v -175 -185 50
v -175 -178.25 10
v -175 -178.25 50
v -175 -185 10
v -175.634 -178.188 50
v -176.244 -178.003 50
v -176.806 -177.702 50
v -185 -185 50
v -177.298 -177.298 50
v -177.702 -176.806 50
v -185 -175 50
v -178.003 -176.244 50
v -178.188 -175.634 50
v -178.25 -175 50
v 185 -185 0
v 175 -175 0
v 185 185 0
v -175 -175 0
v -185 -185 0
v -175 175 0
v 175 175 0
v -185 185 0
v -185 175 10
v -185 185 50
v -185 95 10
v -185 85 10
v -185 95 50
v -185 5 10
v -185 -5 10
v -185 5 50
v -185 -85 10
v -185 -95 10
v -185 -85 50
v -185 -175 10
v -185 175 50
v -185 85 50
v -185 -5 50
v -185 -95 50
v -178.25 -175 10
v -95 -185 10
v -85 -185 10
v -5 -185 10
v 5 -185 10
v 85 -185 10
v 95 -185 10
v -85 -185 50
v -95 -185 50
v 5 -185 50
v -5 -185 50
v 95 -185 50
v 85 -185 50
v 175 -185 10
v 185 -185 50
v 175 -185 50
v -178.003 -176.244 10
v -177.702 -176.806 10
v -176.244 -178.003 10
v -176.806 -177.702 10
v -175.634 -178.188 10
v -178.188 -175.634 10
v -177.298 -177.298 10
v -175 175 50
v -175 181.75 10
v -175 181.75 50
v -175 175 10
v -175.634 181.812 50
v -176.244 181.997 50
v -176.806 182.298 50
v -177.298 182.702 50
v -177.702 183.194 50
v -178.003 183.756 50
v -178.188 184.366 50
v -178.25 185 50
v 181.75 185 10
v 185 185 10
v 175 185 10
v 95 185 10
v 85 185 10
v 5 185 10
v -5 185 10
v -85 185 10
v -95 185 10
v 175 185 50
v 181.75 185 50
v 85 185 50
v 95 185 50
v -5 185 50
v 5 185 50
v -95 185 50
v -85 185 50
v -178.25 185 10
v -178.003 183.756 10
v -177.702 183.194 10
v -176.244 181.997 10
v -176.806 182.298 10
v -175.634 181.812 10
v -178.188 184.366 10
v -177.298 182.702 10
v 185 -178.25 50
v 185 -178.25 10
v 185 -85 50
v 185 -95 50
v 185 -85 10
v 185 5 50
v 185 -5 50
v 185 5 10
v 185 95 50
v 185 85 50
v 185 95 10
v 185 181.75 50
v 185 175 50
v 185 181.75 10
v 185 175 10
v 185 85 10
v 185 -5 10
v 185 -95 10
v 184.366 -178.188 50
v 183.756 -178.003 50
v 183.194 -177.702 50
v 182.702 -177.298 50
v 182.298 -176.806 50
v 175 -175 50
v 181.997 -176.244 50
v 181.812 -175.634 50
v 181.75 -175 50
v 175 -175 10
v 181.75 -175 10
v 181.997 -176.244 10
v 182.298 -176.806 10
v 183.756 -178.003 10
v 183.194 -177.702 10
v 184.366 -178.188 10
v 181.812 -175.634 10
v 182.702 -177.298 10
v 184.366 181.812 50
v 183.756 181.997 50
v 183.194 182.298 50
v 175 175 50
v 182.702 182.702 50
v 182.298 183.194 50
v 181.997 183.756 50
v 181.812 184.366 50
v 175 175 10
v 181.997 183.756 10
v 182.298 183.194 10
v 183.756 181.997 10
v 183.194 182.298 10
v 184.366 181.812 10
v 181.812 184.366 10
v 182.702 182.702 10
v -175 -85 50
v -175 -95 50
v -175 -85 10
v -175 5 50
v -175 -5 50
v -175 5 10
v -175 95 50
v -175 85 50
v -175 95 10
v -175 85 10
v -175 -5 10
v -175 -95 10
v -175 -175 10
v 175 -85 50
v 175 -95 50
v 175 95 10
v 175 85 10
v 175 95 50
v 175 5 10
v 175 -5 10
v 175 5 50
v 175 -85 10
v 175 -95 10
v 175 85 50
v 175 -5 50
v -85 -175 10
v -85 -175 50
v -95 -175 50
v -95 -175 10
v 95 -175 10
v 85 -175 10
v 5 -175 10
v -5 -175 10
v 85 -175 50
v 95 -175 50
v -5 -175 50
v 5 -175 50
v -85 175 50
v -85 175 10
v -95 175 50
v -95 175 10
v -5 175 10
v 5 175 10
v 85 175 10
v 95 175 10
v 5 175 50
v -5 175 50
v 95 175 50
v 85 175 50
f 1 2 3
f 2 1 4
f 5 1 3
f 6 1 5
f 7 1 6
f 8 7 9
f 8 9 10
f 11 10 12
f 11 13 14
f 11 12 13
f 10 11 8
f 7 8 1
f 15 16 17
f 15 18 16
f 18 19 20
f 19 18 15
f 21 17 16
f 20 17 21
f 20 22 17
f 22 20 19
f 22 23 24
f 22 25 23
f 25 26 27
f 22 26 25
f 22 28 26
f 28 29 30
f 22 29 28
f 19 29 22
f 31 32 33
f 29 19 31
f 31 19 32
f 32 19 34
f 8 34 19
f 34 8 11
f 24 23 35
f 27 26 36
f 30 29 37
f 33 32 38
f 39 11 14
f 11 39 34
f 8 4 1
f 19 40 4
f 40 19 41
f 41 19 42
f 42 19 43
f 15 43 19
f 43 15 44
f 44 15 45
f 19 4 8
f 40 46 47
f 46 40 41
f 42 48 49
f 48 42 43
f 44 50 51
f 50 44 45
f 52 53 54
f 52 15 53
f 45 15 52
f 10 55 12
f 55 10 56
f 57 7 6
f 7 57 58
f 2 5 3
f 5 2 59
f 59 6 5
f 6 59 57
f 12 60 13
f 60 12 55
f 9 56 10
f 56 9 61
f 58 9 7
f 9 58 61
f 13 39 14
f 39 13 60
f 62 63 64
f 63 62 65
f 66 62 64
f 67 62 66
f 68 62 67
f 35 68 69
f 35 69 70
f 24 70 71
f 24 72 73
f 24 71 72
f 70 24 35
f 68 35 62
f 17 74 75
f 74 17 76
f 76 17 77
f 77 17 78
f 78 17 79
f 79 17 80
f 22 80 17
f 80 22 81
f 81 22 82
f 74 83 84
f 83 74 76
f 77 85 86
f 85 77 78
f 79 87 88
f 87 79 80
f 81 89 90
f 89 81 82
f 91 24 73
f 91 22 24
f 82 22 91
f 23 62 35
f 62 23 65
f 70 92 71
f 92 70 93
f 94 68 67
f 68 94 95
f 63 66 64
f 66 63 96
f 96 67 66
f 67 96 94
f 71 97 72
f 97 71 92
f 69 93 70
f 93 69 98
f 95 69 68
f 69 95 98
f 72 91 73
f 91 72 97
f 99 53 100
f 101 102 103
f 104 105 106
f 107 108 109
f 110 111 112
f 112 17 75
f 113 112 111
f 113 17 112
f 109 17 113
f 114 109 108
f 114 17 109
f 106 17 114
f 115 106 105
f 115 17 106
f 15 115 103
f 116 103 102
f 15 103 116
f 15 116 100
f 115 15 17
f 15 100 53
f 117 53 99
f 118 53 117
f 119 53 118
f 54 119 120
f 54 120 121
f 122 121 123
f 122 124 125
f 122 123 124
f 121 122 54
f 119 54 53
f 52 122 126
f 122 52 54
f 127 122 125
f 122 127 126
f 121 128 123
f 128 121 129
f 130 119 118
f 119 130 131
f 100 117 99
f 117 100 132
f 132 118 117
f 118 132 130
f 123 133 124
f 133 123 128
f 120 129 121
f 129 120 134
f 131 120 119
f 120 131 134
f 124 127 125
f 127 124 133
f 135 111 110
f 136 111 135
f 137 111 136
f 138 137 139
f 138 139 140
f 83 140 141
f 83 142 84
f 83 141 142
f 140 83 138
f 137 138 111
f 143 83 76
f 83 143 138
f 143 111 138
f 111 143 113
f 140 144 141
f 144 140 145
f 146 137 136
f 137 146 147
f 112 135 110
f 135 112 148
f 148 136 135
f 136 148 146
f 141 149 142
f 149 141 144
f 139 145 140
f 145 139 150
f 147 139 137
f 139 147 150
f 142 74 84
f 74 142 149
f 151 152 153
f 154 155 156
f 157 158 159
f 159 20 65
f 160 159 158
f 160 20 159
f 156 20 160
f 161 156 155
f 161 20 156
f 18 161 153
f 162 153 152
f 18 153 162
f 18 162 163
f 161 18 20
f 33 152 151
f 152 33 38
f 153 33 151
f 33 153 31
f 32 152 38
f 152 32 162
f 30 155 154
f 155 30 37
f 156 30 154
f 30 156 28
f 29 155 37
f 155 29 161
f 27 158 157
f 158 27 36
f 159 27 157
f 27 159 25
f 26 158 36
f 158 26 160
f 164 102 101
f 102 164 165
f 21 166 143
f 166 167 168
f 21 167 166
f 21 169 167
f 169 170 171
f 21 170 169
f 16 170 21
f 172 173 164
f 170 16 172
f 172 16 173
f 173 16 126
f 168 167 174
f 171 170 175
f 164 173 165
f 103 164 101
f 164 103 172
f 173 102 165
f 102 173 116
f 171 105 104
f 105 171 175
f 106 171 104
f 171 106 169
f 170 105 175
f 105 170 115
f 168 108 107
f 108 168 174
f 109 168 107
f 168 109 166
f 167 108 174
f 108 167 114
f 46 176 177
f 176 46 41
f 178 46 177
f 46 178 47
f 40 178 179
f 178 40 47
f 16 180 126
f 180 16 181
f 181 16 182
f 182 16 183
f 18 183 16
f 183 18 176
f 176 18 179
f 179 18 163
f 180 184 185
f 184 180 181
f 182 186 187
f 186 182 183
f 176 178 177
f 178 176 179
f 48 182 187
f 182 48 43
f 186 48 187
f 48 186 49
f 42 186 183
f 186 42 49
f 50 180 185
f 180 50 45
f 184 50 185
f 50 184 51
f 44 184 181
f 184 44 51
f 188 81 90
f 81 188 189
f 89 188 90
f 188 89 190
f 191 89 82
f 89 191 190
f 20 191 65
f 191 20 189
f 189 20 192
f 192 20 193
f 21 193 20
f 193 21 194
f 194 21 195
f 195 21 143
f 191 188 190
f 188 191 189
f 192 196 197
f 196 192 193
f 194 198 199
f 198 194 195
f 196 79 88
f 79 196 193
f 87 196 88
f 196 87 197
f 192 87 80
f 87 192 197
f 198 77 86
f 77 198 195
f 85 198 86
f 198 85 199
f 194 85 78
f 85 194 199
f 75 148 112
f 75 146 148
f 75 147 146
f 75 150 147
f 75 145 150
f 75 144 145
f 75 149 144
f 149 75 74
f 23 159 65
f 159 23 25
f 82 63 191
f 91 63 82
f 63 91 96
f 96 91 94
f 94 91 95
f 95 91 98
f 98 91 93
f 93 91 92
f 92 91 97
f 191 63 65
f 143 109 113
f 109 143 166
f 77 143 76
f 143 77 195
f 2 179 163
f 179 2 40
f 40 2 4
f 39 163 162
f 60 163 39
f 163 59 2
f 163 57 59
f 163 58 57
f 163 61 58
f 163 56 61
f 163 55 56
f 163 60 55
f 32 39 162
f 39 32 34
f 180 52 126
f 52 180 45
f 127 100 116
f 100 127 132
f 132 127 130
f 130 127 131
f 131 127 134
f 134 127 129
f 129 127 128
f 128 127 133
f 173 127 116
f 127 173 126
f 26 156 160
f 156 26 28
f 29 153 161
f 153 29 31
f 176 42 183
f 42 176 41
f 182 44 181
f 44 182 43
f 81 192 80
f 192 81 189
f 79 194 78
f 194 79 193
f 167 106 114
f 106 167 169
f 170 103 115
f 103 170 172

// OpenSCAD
positions = [[-180,-180],[-180,-90],[-180,0],[-180,90],[-180,180],[180,-180],[180,-90],[180,0],[180,90],[180,180],[-90,-180],[0,-180],[90,-180],[-90,180],[0,180],[90,180]];
module vert(px,py){
translate([px,py,25])
difference(){
cube([10,10,50],center=true);
if (abs(px)==180 && abs(py)==180){
translate([5,5,0]) cylinder(r=3.25,h=55,$fn=32,center=true);
}
}
}
module hleft(zh){translate([-180,0,zh]) cube([10,370,10],center=true);}
module hright(zh){translate([180,0,zh]) cube([10,370,10],center=true);}
module hfront(zh){translate([0,-180,zh]) cube([370,10,10],center=true);}
module hback(zh){translate([0,180,zh]) cube([370,10,10],center=true);}
for(p=positions){
vert(p[0],p[1]);
}
hleft(5);
hright(5);
hfront(5);
hback(5);
